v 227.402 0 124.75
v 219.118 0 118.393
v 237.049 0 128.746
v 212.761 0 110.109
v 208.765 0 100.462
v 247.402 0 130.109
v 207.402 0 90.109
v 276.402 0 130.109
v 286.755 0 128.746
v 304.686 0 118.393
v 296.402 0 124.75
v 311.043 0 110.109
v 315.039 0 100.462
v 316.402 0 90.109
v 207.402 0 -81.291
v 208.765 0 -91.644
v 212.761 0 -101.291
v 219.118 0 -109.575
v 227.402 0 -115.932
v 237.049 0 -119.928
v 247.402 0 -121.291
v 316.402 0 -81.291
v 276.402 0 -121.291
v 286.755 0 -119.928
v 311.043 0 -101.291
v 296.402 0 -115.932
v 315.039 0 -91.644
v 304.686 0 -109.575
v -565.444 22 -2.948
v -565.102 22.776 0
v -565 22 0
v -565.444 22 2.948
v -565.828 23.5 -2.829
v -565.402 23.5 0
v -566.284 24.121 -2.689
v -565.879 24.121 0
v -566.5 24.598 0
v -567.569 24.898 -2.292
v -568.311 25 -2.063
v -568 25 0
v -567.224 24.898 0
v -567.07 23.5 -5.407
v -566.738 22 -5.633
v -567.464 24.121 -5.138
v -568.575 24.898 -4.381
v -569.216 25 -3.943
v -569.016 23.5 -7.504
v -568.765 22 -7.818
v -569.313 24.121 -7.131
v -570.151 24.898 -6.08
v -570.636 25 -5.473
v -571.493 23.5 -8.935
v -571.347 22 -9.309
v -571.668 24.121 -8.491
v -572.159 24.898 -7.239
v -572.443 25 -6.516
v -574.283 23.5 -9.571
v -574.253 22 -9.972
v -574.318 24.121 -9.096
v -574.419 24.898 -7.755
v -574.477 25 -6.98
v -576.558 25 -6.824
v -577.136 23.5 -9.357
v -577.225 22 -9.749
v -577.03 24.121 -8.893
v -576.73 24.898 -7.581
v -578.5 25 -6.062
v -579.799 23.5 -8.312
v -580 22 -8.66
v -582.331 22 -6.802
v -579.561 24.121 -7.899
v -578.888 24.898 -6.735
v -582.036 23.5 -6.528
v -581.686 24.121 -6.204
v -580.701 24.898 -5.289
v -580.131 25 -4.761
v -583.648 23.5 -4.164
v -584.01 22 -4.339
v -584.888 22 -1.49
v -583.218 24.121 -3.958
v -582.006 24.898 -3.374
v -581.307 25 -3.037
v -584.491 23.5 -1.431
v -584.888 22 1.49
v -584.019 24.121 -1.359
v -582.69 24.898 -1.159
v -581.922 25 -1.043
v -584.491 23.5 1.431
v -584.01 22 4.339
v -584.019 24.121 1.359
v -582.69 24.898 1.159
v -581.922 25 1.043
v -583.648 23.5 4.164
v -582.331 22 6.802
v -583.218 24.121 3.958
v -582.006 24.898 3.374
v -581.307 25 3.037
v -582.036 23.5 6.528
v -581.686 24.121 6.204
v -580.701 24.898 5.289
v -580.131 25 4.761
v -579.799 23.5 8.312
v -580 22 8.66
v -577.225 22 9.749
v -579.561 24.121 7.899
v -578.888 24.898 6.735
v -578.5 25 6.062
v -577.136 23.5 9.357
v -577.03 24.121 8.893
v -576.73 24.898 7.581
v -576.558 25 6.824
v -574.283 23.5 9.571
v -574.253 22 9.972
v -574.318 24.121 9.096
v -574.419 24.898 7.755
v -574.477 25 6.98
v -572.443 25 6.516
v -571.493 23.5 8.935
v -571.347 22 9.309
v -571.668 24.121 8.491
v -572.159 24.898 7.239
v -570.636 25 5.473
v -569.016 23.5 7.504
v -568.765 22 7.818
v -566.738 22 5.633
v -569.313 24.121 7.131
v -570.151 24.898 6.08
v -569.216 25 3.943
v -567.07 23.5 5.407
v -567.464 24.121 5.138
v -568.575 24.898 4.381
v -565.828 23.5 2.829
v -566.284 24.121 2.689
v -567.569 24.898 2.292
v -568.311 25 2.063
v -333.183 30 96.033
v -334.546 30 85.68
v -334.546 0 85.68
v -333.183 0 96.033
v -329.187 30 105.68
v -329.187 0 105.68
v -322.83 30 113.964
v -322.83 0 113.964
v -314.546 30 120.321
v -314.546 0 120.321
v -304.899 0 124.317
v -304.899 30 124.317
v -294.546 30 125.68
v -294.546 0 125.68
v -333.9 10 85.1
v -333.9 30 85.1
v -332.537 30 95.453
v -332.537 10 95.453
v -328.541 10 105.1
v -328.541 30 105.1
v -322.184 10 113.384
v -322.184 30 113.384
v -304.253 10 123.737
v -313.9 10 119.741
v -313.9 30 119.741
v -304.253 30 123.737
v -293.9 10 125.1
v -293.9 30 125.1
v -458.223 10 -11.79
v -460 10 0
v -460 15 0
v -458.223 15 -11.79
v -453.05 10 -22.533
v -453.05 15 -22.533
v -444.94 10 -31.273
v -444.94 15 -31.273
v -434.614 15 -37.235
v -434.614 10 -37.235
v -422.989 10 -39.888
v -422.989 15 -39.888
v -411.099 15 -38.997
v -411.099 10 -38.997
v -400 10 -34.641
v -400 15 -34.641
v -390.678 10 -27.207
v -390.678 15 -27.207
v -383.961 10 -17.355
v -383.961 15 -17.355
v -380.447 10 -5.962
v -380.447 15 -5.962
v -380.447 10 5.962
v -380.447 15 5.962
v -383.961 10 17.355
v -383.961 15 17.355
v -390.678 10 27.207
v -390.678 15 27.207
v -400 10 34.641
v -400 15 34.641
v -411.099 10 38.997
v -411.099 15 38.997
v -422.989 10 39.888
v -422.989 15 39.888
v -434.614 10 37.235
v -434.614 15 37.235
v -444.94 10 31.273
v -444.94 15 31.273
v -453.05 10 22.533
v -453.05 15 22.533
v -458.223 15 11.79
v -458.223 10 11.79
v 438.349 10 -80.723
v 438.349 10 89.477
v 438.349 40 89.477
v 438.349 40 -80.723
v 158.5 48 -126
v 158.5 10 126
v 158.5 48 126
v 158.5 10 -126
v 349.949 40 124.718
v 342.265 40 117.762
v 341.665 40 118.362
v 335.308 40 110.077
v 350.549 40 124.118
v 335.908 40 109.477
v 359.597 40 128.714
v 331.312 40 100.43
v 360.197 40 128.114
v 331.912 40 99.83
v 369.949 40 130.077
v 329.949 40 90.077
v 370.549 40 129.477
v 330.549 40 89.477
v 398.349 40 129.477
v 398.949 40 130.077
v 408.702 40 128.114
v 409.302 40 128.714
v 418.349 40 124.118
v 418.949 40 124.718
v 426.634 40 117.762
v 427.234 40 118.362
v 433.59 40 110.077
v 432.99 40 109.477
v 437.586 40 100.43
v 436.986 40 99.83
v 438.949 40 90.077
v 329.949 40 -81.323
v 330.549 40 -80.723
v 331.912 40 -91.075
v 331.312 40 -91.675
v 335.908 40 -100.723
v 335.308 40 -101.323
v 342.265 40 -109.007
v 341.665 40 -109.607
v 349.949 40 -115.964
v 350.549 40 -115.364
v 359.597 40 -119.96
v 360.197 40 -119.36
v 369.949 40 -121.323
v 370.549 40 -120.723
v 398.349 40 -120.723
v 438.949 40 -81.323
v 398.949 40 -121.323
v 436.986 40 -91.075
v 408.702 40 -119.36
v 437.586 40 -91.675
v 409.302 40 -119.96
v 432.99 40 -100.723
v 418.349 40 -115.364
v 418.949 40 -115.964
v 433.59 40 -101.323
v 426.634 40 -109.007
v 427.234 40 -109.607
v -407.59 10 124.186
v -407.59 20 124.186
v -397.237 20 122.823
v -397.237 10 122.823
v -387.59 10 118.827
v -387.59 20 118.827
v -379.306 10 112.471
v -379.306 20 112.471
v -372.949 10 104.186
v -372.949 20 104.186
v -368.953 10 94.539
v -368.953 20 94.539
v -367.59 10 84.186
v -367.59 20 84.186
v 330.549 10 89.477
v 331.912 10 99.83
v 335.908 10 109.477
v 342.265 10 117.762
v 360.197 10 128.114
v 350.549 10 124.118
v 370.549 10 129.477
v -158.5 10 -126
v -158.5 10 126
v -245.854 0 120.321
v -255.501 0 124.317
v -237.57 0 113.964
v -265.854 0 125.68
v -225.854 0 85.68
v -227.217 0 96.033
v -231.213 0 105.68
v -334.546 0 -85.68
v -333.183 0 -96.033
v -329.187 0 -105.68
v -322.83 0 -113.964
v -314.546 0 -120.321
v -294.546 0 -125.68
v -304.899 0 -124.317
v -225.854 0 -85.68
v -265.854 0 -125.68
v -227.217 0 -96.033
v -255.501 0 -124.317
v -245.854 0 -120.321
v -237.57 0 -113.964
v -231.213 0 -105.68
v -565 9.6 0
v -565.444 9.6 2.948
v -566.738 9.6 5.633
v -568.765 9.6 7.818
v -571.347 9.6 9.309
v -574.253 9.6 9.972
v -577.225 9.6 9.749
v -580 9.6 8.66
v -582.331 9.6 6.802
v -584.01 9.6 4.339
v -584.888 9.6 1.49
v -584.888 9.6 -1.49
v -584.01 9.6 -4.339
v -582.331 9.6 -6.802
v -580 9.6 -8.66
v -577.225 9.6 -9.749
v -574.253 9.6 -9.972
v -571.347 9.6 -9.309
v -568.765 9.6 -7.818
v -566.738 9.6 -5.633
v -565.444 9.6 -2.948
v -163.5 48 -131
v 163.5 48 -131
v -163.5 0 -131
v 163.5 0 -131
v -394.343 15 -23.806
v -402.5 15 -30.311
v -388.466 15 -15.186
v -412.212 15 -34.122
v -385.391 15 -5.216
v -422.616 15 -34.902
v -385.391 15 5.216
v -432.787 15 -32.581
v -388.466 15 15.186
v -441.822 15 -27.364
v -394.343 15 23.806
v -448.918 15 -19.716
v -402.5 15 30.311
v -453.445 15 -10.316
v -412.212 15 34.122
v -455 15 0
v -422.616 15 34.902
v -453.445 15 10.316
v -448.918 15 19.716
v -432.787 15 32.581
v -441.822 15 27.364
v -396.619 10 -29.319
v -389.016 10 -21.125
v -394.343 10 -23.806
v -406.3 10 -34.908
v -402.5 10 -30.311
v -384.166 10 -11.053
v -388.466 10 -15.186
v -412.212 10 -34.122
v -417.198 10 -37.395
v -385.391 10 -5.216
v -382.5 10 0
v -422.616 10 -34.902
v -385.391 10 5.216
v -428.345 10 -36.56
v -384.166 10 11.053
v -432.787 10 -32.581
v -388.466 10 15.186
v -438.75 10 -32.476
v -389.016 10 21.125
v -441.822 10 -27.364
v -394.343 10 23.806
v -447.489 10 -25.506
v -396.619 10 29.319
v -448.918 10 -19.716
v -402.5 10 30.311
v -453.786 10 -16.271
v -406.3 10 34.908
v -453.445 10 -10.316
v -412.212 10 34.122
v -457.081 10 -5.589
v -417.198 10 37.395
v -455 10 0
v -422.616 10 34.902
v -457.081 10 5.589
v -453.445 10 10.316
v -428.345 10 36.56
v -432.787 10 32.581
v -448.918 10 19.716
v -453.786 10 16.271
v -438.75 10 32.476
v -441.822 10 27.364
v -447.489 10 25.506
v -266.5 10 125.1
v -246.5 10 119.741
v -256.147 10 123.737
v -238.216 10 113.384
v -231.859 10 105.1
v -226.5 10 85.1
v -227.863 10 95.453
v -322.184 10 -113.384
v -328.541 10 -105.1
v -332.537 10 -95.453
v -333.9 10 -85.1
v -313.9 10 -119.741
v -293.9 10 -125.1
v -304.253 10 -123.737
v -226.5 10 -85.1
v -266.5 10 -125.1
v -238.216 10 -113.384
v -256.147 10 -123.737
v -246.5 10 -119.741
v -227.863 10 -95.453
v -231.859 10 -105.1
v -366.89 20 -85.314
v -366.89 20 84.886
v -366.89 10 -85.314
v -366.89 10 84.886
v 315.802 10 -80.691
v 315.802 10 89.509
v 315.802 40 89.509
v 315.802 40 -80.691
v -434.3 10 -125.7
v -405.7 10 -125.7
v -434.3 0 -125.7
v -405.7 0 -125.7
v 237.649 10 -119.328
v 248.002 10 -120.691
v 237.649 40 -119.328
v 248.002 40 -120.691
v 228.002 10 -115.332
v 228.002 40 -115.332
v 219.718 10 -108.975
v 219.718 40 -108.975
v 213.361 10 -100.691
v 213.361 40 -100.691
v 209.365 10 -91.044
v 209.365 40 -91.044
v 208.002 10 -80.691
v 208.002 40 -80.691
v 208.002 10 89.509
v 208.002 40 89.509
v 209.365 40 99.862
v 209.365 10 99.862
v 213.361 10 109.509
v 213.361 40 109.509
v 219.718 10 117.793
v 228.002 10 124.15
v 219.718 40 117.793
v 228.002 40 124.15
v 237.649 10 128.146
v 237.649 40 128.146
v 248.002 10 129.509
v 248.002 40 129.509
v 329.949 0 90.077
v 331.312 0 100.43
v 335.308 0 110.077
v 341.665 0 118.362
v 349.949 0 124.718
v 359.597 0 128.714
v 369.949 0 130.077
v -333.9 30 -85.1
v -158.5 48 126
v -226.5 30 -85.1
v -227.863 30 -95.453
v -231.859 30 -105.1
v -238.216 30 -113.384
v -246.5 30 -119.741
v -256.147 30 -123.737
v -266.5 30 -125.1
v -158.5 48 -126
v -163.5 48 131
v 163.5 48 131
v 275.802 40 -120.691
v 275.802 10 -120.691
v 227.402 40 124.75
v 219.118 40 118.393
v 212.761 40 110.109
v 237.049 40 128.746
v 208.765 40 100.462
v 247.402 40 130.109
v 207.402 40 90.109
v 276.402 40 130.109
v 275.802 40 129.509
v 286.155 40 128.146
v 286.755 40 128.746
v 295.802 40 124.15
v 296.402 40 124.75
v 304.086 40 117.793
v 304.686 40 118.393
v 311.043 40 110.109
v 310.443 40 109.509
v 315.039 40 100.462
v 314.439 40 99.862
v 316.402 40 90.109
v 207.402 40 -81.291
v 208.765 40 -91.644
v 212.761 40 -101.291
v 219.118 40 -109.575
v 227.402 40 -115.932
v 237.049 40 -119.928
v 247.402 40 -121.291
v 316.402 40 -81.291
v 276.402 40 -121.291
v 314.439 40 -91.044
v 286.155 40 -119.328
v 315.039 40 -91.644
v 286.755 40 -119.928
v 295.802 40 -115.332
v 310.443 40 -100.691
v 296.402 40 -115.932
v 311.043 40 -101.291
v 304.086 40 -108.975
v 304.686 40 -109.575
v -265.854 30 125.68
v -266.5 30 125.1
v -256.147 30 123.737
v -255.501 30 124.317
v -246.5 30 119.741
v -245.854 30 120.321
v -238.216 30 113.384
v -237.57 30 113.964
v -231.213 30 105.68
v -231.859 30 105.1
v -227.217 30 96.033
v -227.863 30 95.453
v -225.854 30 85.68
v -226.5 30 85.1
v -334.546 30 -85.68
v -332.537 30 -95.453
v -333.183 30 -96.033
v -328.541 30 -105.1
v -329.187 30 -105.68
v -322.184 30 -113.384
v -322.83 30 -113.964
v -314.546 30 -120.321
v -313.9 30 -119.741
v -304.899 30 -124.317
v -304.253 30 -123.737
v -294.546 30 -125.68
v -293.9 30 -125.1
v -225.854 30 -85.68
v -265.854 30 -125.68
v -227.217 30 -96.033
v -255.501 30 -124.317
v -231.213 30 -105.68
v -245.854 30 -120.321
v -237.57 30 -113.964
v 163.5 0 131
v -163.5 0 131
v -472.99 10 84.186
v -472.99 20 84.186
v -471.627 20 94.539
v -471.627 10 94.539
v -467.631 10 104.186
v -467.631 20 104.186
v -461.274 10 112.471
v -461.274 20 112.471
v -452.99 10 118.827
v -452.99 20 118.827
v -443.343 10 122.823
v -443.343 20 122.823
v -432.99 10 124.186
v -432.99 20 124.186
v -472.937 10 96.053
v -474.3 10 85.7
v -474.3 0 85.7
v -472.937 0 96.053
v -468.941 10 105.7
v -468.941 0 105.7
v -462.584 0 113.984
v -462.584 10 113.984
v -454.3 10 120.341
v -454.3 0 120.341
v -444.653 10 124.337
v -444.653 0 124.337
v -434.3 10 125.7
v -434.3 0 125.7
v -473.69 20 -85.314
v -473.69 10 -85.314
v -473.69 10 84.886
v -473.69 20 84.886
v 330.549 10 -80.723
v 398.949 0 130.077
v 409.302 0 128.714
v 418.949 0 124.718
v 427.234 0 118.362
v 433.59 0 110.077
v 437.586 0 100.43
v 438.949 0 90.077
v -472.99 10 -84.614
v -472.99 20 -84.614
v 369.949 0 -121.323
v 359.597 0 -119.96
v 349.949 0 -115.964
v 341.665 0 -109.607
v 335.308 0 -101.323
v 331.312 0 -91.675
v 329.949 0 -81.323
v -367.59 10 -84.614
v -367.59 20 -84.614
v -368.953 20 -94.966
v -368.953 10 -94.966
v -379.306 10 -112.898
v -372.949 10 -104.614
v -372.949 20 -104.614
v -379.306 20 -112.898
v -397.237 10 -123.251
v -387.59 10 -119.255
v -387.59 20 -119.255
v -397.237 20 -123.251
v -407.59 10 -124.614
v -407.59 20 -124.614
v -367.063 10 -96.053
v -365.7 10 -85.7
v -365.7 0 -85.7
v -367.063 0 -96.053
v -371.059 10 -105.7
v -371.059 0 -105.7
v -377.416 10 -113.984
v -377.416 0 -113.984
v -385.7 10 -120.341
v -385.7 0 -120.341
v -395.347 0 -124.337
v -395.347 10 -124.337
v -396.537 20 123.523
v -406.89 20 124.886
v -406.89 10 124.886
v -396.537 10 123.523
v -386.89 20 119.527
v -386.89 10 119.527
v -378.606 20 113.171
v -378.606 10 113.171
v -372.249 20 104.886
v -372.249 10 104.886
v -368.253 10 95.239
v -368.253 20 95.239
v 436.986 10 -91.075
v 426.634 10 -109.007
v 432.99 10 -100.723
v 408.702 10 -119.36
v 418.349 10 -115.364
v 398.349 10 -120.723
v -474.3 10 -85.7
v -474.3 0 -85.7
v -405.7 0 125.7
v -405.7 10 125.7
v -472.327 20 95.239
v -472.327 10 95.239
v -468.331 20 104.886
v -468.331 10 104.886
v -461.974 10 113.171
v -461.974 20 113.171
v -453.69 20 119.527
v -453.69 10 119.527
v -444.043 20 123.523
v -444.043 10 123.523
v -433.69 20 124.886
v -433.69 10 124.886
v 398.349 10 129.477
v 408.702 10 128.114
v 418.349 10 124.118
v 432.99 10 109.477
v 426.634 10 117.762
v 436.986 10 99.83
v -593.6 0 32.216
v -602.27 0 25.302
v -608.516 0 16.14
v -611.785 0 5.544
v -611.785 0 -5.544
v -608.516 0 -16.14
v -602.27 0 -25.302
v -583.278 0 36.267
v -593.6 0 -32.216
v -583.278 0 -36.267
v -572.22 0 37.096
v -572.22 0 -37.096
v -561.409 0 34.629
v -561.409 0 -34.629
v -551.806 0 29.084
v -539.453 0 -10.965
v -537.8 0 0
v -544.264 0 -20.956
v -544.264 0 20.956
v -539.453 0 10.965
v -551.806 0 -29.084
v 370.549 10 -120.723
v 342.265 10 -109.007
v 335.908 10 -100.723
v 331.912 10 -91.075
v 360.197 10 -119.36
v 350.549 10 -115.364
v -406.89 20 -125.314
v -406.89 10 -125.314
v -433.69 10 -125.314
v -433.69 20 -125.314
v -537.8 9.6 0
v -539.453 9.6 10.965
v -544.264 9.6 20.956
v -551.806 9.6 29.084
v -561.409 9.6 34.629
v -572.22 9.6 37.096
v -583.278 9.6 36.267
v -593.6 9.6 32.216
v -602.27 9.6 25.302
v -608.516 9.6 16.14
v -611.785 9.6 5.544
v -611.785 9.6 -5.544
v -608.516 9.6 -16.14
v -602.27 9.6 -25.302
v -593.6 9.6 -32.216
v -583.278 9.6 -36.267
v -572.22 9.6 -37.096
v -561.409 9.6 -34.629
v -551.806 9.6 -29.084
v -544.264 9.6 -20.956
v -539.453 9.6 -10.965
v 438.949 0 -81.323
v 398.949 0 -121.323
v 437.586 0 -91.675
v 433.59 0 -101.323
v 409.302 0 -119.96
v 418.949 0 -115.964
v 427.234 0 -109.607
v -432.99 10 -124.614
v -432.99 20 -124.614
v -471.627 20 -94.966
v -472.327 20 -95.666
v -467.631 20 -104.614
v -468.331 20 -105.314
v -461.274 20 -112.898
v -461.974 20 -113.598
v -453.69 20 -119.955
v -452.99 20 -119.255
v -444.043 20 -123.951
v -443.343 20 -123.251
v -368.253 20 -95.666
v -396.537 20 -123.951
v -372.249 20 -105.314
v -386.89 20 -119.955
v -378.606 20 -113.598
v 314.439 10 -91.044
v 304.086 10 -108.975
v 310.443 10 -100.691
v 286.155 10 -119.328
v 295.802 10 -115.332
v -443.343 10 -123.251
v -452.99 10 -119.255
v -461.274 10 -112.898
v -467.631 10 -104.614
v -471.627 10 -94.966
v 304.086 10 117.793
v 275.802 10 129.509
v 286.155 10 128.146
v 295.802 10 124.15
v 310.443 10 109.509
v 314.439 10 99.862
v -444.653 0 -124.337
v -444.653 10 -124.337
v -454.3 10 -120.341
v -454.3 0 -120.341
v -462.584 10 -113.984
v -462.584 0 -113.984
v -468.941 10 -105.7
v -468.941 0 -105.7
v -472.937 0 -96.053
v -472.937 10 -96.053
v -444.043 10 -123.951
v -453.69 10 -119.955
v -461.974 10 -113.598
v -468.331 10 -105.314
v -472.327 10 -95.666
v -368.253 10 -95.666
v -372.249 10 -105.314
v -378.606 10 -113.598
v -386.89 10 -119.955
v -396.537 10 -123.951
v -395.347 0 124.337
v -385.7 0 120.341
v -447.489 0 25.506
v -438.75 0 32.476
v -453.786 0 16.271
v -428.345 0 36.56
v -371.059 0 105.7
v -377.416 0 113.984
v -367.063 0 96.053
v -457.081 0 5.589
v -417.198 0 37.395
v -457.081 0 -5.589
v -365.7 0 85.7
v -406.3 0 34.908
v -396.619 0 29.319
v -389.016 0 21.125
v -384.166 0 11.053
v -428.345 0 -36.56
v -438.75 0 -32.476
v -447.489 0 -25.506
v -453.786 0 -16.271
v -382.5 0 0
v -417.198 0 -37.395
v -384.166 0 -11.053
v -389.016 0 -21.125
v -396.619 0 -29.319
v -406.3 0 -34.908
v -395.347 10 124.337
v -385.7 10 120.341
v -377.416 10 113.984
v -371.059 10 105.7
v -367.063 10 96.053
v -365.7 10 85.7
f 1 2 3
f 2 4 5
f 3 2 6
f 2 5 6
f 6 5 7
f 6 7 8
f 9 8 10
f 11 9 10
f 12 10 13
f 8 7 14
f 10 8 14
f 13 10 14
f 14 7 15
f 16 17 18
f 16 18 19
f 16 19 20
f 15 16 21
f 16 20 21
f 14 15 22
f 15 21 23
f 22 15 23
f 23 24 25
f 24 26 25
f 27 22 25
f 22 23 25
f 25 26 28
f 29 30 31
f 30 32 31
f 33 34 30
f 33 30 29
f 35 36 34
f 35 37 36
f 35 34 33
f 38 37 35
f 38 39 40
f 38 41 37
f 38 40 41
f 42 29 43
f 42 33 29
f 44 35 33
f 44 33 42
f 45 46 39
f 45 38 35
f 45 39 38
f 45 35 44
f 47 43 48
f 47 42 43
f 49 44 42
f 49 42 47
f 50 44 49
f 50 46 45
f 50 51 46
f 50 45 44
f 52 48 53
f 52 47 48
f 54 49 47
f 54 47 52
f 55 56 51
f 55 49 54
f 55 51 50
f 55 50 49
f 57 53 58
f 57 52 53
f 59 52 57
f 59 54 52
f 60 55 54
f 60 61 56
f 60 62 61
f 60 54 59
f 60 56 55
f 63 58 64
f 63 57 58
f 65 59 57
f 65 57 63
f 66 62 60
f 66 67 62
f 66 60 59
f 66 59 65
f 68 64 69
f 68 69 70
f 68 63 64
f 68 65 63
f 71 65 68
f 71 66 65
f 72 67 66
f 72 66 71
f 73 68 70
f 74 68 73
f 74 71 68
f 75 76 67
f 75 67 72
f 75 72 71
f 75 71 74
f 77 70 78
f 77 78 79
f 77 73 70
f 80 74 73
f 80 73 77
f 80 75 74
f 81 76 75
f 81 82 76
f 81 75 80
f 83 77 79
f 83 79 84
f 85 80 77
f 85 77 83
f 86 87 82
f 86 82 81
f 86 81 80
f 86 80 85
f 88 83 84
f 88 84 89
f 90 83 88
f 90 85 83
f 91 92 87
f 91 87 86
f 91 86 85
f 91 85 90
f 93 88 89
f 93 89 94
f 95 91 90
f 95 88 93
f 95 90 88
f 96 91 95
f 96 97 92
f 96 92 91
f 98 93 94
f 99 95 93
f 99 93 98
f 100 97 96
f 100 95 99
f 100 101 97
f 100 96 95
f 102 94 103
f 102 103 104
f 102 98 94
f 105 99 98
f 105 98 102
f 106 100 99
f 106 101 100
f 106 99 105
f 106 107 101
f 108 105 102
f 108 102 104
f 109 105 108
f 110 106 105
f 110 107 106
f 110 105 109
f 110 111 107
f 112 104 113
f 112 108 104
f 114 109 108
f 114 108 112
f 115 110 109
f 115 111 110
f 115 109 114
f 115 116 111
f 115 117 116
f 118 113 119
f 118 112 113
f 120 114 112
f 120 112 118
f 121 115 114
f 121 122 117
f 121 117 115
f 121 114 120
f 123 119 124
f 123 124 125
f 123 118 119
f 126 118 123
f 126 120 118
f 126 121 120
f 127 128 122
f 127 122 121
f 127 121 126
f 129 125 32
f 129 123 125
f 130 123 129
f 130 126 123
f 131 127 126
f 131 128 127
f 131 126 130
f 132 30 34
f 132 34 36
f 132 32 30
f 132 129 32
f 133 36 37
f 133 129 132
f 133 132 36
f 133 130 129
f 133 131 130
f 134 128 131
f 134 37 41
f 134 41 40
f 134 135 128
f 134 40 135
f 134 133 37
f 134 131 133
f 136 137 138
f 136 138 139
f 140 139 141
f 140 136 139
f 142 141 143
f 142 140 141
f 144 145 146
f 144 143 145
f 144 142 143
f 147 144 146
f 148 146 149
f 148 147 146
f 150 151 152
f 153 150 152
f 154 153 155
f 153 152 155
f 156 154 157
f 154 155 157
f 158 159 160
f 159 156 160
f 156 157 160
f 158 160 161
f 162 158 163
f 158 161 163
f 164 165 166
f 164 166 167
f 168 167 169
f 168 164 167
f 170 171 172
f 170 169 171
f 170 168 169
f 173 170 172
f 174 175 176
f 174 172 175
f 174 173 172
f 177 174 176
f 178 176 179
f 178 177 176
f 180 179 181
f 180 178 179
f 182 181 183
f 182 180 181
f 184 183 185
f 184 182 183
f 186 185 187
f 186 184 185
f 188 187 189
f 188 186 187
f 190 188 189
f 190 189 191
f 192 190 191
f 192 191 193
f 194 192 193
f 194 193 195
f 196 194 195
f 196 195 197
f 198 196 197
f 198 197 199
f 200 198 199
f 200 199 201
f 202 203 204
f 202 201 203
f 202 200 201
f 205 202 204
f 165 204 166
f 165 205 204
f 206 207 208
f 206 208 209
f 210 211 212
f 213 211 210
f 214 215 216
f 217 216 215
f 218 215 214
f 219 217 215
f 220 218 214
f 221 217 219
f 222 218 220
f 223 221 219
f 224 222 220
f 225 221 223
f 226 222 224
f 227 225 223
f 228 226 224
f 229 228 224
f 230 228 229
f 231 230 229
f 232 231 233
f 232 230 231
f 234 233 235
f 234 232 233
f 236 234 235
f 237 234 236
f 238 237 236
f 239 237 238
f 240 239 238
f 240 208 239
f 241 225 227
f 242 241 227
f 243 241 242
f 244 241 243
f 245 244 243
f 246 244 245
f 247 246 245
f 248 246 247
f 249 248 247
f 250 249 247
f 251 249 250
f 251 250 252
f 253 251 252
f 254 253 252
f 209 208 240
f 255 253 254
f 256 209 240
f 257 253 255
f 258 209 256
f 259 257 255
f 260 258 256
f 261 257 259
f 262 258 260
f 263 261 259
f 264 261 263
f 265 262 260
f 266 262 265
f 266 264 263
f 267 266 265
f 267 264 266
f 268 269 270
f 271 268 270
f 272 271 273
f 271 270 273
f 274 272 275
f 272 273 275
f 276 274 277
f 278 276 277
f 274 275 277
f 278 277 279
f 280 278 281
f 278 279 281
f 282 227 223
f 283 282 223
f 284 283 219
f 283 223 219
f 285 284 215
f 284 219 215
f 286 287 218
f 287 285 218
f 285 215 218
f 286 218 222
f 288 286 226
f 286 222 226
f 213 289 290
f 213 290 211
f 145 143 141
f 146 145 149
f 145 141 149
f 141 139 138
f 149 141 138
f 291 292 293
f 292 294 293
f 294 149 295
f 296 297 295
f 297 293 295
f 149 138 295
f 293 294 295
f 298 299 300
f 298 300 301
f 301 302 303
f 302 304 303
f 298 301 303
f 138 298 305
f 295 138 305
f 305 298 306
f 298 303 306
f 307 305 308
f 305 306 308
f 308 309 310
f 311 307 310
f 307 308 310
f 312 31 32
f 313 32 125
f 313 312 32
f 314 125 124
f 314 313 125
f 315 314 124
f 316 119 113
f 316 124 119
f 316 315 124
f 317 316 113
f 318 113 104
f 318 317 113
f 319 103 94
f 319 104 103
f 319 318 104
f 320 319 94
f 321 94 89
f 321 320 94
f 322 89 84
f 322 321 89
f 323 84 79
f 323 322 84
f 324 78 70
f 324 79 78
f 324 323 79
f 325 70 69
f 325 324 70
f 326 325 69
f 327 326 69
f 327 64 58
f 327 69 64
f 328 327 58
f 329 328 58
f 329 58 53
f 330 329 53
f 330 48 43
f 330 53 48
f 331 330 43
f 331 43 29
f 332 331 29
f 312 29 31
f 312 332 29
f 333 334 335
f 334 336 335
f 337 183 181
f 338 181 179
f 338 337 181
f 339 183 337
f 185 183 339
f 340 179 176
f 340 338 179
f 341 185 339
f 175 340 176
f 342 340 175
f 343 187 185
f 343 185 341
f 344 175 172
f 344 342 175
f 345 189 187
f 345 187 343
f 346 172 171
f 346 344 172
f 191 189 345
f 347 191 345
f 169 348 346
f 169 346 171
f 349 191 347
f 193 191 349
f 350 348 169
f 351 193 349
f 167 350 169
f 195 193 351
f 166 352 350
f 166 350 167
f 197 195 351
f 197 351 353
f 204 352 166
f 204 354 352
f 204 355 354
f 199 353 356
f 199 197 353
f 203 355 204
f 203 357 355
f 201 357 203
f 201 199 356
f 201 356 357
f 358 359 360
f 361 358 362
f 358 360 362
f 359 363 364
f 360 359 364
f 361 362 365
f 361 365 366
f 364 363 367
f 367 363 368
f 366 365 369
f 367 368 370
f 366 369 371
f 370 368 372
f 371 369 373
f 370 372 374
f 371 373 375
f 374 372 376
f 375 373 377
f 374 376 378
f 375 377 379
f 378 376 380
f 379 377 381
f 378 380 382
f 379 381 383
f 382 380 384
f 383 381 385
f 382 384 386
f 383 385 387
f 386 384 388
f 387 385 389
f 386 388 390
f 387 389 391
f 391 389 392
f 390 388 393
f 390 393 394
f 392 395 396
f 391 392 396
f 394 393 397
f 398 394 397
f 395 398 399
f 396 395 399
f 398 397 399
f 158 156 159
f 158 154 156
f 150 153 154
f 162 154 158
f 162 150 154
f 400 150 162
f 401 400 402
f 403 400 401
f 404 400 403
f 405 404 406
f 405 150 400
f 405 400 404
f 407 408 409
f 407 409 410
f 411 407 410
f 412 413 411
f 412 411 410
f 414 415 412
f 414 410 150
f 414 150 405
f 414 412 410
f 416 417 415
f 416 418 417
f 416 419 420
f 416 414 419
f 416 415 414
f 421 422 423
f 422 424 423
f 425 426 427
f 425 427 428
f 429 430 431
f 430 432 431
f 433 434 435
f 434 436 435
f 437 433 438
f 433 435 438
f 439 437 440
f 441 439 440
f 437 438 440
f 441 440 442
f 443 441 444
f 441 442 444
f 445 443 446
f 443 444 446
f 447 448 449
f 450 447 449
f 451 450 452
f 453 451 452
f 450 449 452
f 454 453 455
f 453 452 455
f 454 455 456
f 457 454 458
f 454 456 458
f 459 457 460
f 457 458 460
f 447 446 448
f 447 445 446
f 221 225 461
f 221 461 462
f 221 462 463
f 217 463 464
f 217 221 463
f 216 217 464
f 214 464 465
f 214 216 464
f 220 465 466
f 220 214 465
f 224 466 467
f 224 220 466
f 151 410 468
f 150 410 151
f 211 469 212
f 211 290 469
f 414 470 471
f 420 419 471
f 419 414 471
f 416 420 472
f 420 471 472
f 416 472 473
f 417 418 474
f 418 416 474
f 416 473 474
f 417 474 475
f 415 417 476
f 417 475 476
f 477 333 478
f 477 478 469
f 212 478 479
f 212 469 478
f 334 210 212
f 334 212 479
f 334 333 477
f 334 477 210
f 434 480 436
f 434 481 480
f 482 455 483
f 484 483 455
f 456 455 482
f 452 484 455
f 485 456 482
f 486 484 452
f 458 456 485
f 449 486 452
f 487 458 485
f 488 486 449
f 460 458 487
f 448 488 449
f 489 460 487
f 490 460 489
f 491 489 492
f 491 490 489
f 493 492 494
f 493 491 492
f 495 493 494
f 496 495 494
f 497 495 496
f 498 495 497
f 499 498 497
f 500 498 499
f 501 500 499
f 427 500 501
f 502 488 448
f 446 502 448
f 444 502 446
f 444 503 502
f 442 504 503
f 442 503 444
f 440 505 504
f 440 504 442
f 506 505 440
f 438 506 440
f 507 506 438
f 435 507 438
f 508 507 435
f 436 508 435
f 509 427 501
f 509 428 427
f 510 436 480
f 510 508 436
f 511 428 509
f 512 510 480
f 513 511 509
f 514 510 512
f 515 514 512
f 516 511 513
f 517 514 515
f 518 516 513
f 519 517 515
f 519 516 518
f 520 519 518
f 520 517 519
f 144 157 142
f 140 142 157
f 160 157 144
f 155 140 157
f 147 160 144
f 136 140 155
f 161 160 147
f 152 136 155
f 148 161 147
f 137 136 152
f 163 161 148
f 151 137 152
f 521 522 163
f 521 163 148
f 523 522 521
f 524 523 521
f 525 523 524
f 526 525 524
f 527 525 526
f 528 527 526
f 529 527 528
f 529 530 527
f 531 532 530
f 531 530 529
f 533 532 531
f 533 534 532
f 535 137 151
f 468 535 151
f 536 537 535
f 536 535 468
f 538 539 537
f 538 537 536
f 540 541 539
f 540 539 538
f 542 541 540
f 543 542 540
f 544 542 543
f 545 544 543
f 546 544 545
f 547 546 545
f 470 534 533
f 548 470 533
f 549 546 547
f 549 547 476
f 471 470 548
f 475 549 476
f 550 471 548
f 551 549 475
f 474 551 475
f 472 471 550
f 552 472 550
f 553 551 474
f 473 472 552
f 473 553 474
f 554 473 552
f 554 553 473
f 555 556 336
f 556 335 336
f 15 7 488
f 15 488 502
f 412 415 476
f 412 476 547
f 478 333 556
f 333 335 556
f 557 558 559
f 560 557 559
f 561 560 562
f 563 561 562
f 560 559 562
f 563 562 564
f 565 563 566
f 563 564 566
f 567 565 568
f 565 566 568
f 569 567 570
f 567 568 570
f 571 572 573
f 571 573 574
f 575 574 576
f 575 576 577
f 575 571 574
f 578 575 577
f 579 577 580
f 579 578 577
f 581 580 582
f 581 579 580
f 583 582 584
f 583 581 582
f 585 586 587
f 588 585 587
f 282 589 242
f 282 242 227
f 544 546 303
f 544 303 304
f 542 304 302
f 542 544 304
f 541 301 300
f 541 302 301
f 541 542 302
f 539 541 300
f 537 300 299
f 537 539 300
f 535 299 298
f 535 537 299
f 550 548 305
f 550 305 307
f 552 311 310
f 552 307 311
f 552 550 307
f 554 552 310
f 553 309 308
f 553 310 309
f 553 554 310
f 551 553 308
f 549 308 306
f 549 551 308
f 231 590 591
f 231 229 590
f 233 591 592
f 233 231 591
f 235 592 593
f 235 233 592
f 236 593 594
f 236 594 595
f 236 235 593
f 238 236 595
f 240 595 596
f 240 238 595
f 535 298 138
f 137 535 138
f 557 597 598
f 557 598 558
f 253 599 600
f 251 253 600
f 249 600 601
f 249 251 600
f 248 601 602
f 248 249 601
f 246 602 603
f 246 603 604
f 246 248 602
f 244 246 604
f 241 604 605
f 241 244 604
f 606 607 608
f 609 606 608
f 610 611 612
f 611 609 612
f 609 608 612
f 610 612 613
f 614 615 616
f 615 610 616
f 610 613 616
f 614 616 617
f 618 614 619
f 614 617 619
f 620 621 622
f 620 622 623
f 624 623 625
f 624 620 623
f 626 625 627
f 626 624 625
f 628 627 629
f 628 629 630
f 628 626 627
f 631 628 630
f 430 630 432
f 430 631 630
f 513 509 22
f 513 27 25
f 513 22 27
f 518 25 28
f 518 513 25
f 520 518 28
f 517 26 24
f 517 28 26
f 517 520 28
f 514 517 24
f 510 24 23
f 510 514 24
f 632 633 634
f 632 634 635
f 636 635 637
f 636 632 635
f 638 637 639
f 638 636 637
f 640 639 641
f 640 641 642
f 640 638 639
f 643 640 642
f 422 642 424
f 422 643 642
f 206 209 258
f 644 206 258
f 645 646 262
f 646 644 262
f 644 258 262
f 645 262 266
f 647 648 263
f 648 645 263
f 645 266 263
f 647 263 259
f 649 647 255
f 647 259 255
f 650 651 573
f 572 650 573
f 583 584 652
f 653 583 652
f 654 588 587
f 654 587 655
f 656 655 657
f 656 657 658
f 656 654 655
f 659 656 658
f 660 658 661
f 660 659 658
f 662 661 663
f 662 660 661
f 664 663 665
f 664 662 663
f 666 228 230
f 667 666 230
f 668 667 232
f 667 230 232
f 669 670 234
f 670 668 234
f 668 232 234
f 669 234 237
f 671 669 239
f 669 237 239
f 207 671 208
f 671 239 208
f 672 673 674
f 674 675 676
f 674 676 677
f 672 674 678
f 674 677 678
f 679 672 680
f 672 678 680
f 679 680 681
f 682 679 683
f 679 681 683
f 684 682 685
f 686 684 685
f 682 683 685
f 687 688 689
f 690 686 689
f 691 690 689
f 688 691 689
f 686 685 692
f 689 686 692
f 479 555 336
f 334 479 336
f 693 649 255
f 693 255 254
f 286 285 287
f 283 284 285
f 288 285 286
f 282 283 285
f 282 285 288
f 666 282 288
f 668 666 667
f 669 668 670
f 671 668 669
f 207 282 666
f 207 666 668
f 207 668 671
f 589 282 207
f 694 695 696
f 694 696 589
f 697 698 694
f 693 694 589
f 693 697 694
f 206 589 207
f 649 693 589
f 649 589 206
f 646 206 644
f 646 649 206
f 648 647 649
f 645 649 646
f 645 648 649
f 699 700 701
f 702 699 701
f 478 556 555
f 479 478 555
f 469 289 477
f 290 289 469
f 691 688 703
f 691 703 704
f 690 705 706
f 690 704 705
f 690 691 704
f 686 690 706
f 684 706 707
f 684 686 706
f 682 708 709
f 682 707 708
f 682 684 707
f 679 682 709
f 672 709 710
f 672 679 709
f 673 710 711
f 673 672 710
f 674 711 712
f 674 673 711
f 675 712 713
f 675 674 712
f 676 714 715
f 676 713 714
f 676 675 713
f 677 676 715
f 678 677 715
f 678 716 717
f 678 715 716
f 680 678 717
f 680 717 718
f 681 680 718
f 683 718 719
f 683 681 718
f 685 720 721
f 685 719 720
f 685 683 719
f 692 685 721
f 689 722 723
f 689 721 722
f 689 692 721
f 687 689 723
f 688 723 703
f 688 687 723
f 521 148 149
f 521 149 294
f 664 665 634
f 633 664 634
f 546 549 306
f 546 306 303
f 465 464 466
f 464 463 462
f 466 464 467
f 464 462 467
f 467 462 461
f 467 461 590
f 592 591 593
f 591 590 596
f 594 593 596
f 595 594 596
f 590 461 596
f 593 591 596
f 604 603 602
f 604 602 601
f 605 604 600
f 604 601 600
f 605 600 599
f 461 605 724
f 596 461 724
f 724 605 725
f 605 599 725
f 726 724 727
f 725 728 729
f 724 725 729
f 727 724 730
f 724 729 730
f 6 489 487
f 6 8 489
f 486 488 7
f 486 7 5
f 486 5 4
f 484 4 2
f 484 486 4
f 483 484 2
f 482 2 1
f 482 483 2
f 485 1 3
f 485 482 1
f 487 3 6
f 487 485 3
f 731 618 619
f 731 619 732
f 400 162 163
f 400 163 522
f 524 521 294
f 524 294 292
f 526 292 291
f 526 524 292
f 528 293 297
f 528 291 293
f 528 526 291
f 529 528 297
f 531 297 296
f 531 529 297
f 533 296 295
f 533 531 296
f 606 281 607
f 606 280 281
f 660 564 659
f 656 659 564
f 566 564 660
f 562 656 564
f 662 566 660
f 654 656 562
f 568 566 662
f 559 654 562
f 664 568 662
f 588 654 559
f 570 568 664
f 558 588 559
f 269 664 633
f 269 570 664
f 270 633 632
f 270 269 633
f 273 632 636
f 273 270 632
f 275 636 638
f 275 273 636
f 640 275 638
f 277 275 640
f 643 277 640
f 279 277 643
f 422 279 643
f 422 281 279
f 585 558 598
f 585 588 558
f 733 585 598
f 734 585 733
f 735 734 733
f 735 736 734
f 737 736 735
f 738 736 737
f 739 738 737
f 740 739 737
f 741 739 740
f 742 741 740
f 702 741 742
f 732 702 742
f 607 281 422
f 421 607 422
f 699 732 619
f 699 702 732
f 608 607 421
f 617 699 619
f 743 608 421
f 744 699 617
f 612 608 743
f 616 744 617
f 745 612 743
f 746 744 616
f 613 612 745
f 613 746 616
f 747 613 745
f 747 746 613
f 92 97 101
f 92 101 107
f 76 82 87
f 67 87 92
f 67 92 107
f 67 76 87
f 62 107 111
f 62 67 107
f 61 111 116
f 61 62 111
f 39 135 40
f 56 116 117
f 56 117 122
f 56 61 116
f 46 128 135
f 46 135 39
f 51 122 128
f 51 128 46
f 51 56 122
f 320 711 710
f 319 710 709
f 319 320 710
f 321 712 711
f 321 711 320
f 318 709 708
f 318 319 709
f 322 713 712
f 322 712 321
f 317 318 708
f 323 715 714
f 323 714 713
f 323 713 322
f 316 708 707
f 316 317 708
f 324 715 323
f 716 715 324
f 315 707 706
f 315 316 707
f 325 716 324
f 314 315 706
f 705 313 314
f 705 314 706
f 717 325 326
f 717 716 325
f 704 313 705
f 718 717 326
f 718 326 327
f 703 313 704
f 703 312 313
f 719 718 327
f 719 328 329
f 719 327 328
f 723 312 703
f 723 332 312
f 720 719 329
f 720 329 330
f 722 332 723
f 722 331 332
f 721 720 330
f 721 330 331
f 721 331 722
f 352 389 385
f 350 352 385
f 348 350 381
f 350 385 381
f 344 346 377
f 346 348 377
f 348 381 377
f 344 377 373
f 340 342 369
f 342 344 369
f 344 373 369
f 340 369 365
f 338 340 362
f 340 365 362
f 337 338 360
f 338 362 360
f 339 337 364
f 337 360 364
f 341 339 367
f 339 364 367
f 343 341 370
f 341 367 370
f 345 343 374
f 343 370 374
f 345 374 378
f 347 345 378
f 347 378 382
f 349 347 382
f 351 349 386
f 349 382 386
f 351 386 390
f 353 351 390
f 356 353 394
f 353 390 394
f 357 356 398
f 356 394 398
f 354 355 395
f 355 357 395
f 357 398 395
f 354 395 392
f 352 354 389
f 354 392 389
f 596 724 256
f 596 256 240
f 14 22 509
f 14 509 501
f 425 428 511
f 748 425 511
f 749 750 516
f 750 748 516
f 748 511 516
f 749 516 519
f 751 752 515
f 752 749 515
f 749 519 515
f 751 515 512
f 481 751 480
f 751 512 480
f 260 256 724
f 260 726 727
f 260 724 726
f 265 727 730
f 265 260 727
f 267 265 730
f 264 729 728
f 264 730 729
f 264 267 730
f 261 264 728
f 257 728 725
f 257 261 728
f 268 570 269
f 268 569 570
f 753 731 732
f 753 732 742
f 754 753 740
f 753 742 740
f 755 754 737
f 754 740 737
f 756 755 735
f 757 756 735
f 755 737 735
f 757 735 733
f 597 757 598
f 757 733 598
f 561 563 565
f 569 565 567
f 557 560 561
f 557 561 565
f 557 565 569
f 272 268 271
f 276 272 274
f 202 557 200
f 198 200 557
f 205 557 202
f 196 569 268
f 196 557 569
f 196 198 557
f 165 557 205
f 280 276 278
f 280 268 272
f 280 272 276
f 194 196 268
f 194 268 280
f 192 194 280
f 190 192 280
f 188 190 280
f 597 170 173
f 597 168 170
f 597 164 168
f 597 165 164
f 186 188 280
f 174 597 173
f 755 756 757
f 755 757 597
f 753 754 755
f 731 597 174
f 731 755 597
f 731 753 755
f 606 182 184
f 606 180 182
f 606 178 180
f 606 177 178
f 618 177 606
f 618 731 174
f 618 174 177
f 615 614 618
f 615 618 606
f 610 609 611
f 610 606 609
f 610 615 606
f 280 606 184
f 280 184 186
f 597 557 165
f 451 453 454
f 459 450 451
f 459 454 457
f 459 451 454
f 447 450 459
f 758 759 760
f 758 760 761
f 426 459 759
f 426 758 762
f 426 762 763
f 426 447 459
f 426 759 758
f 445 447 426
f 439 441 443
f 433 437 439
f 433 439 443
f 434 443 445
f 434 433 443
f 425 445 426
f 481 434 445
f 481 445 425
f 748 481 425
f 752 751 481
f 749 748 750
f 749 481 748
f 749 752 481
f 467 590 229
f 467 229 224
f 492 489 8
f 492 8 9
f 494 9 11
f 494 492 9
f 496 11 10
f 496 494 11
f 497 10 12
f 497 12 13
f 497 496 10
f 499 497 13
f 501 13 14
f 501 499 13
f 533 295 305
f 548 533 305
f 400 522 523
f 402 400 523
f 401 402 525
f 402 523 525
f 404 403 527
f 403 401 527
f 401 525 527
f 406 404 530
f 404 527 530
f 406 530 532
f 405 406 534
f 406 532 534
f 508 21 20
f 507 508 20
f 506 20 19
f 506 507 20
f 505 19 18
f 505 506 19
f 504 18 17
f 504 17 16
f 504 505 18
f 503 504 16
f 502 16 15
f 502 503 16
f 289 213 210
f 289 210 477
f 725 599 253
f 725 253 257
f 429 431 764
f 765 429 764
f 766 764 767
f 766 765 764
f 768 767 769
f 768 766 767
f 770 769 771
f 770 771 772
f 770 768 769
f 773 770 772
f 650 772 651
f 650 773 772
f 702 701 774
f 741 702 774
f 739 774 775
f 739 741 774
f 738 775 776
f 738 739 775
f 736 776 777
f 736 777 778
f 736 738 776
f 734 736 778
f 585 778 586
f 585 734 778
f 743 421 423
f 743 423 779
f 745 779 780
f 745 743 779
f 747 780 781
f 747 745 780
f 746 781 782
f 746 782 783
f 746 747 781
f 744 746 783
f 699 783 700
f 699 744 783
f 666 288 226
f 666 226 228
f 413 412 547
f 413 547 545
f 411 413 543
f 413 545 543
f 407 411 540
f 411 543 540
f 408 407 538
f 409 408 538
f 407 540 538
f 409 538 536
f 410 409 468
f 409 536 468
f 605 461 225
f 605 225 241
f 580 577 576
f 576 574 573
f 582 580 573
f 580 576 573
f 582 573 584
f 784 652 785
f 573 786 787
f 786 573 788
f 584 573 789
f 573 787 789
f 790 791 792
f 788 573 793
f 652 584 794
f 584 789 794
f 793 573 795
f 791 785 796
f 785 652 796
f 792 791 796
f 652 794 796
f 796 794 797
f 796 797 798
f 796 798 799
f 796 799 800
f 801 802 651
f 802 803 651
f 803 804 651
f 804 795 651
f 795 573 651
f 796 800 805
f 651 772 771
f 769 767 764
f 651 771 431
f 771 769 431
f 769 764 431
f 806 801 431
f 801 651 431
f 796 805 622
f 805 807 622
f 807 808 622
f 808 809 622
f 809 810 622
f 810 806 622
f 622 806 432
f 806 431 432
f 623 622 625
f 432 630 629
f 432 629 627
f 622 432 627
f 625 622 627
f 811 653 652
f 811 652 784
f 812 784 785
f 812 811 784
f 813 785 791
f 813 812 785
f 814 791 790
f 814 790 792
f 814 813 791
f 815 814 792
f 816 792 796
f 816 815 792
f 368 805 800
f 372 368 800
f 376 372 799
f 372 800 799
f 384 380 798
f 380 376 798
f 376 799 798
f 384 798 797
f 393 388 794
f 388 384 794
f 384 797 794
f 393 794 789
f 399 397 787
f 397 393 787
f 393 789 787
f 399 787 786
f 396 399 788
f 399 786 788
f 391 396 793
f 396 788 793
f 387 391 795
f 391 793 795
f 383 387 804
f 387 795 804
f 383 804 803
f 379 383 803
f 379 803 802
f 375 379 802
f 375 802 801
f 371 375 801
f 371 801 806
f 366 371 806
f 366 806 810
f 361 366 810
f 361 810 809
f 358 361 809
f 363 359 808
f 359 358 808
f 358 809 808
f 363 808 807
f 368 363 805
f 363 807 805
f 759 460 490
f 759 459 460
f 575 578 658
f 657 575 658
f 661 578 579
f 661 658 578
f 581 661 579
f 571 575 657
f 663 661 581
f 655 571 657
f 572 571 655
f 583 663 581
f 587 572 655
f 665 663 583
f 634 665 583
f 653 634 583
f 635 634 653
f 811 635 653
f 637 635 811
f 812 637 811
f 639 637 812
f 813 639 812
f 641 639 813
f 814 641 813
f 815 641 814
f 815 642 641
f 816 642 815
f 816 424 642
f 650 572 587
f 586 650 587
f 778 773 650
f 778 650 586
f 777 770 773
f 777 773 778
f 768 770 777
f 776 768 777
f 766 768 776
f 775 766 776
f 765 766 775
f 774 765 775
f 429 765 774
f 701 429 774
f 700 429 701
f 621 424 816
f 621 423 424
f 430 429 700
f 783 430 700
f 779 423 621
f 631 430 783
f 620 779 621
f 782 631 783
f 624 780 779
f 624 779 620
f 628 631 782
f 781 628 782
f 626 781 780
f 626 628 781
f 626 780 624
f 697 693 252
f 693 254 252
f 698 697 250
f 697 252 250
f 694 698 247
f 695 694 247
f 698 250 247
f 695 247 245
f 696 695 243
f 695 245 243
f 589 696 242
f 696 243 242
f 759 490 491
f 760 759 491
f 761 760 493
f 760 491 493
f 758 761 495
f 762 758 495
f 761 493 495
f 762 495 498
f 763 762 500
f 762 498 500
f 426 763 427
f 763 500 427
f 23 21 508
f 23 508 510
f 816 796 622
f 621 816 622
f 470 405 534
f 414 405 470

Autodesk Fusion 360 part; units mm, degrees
sketch "Sketch1" plane through (0, 0, 0) normal (0, 1, 0) x (1, 0, 0)
  line L0 (163.5, 131) -> (-163.5, 131)
  line L1 (-163.5, 131) -> (-163.5, -131)
  line L2 (-163.5, -131) -> (163.5, -131)
  line L3 (163.5, -131) -> (163.5, 131)
  line L4 (163.5, 131) -> (-163.5, -131) construction
  line L5 (-163.5, 131) -> (163.5, -131) construction
  line L6 (158.5, 126) -> (-158.5, 126)
  line L7 (-158.5, 126) -> (-158.5, -126)
  line L8 (-158.5, -126) -> (158.5, -126)
  line L9 (158.5, -126) -> (158.5, 126)
  line L10 (158.5, 126) -> (-158.5, -126) construction
  line L11 (-158.5, 126) -> (158.5, -126) construction
  dimension "d1" = 327
  dimension "d2" = 262
  dimension "d3" = 317
  dimension "d4" = 252
extrude "Extrude1" add sketch "Sketch1" along normal blind 48 makes body 1
sketch "Sketch2" plane through (0, 0, 0) normal (0, 1, 0) x (1, 0, 0)
  line L0 (-161.5, 130) -> (161.5, 130)
  line L1 (161.5, 130) -> (161.5, -130)
  line L2 (161.5, -130) -> (-161.5, -130)
  line L3 (-161.5, -130) -> (-161.5, 130)
  line L4 (-161.5, 130) -> (161.5, -130) construction
  line L5 (161.5, 130) -> (-161.5, -130) construction
  dimension "d7" = 323
  dimension "d8" = 260
extrude "Extrude2" add sketch "Sketch2" along normal blind 10 bodies 1
sketch "Sketch3" plane through (0, 10, 0) normal (0, 1, 0) x (-1, 0, 0)
  line L0 (158.5, 126) -> (-158.5, 126)
  line L1 (-158.5, 126) -> (-158.5, -126)
  line L2 (-158.5, -126) -> (158.5, -126)
  line L3 (158.5, -126) -> (158.5, 126)
sketch "Sketch4" plane through (0, 10, 0) normal (0, 1, 0) x (-1, 0, 0)
  line L0 (158.5, 126) -> (-158.5, 126)
  line L1 (-158.5, 126) -> (-158.5, -126)
  line L2 (-158.5, -126) -> (158.5, -126)
  line L3 (158.5, -126) -> (158.5, 126)
  line L4 (-320, -124) -> (-220, -124)
  line L5 (-220, -124) -> (-220, 124)
  line L6 (-220, 124) -> (-320, 124)
  line L7 (-320, 124) -> (-320, -124)
  line L8 (-320, -124) -> (-220, 124) construction
  line L9 (-220, -124) -> (-320, 124) construction
  point P0 (-270, 0)
  dimension "d17" = 100
  dimension "d18" = 248
sketch "Sketch5" plane through (0, 20, 0) normal (0, 1, 0) x (-1, 0, 0)
sketch "Sketch6" plane through (0, 10, 0) normal (0, 1, 0) x (-1, 0, 0)
  line L0 (158.5, 126) -> (-158.5, 126)
  line L1 (-158.5, 126) -> (-158.5, -126)
  line L2 (-158.5, -126) -> (158.5, -126)
  line L3 (158.5, -126) -> (158.5, 126)
sketch "Sketch9" plane through (0, 20, 0) normal (0, 1, 0) x (-1, 0, 0)
sketch "Sketch10" plane through (0, 10, 0) normal (0, 1, 0) x (-1, 0, 0)
sketch "Sketch11" plane through (0, 0, 0) normal (0, 1, 0) x (1, 0, 0)
sketch "Sketch12" plane through (0, 20, 0) normal (0, 1, 0) x (1, 0, 0)
sketch "Sketch14" plane through (0, 0, 0) normal (0, 1, 0) x (1, 0, 0)
sketch "Sketch15" plane through (0, 0, 0) normal (0, 1, 0) x (1, 0, 0)
  line L0 (207.402, 121.291) -> (316.402, 121.291)
  line L1 (316.402, 121.291) -> (316.402, -130.109)
  line L2 (316.402, -130.109) -> (207.402, -130.109)
  line L3 (207.402, -130.109) -> (207.402, 121.291)
  line L4 (207.402, 121.291) -> (316.402, -130.109) construction
  line L5 (316.402, 121.291) -> (207.402, -130.109) construction
  line L6 (315.802, 120.691) -> (208.002, 120.691)
  line L7 (208.002, 120.691) -> (208.002, -129.509)
  line L8 (208.002, -129.509) -> (315.802, -129.509)
  line L9 (315.802, -129.509) -> (315.802, 120.691)
  line L10 (315.802, 120.691) -> (208.002, -129.509) construction
  line L11 (208.002, 120.691) -> (315.802, -129.509) construction
  point P0 (261.902, -4.409)
  point P1 (261.902, -4.409)
  dimension "d42" = 109
  dimension "d43" = 251.4
  dimension "d44" = 107.8
  dimension "d45" = 250.2
extrude "Extrude8" add sketch "Sketch15" along normal blind 40 separate body makes body 2
extrude "Extrude9" add sketch "Sketch15" along normal blind 10 contours L6 L7 L8 L9 bodies 2
sketch "Sketch16" plane through (0, 0, 0) normal (0, 1, 0) x (1, 0, 0)
sketch "Sketch17" plane through (0, 0, 0) normal (0, 1, 0) x (1, 0, 0)
  line L0 (329.9494, 121.3227) -> (438.9494, 121.3227)
  line L1 (438.9494, 121.3227) -> (438.9494, -130.0773)
  line L2 (438.9494, -130.0773) -> (329.9494, -130.0773)
  line L3 (329.9494, -130.0773) -> (329.9494, 121.3227)
  line L4 (329.9494, 121.3227) -> (438.9494, -130.0773) construction
  line L5 (438.9494, 121.3227) -> (329.9494, -130.0773) construction
  line L6 (438.3494, 120.7227) -> (330.5494, 120.7227)
  line L7 (330.5494, 120.7227) -> (330.5494, -129.4773)
  line L8 (330.5494, -129.4773) -> (438.3494, -129.4773)
  line L9 (438.3494, -129.4773) -> (438.3494, 120.7227)
  line L10 (438.3494, 120.7227) -> (330.5494, -129.4773) construction
  line L11 (330.5494, 120.7227) -> (438.3494, -129.4773) construction
  point P0 (384.4494, -4.3773)
  point P1 (384.4494, -4.3773)
  dimension "d50" = 109
  dimension "d51" = 251.4
  dimension "d52" = 107.8
  dimension "d53" = 250.2
sketch "Sketch18" plane through (0, 0, 0) normal (0, 1, 0) x (1, 0, 0)
  line L0 (434.5, 120.7) -> (325.5, 120.7)
  line L1 (325.5, 120.7) -> (325.5, -120.7)
  line L2 (325.5, -120.7) -> (434.5, -120.7)
  line L3 (434.5, -120.7) -> (434.5, 120.7)
  line L4 (434.5, 120.7) -> (325.5, -120.7) construction
  line L5 (325.5, 120.7) -> (434.5, -120.7) construction
  point P0 (380, 0)
  dimension "d54" = 109
  dimension "d55" = 241.4
sketch "Sketch20" plane through (0, 0, 0) normal (0, 1, 0) x (1, 0, 0)
  line L0 (-225.9, 125.7) -> (-334.5, 125.7)
  line L1 (-334.5, 125.7) -> (-334.5, -125.5)
  line L2 (-334.5, -125.5) -> (-225.9, -125.5)
  line L3 (-225.9, -125.5) -> (-225.9, 125.7)
  line L4 (-225.9, 125.7) -> (-334.5, -125.5) construction
  line L5 (-334.5, 125.7) -> (-225.9, -125.5) construction
  point P0 (-280.2, 0.1)
  dimension "d60" = 108.6
  dimension "d61" = 251.2
sketch "Sketch35" plane through (0, 0, 0) normal (0, 1, 0) x (1, 0, 0)
  line L0 (-365.7, 125.7) -> (-474.3, 125.7)
  line L1 (-474.3, 125.7) -> (-474.3, -125.7)
  line L2 (-474.3, -125.7) -> (-365.7, -125.7)
  line L3 (-365.7, -125.7) -> (-365.7, 125.7)
  line L4 (-365.7, 125.7) -> (-474.3, -125.7) construction
  line L5 (-474.3, 125.7) -> (-365.7, -125.7) construction
  circle A0 centre (-420, 0) radius 37.5
  point P0 (-420, 0)
  dimension "d73" = 108.6
  dimension "d82" = 75
  dimension "d111" = 251.4
sketch "Sketch37" plane through (0, 0, 0) normal (0, 1, 0) x (1, 0, 0)
  line L0 (-366.8902, 125.3136) -> (-473.6902, 125.3136)
  line L1 (-473.6902, 125.3136) -> (-473.6902, -124.8864)
  line L2 (-473.6902, -124.8864) -> (-366.8902, -124.8864)
  line L3 (-366.8902, -124.8864) -> (-366.8902, 125.3136)
  line L4 (-366.8902, 125.3136) -> (-473.6902, -124.8864) construction
  line L5 (-473.6902, 125.3136) -> (-366.8902, -124.8864) construction
  line L6 (-367.5902, 124.6136) -> (-472.9902, 124.6136)
  line L7 (-472.9902, 124.6136) -> (-472.9902, -124.1864)
  line L8 (-472.9902, -124.1864) -> (-367.5902, -124.1864)
  line L9 (-367.5902, -124.1864) -> (-367.5902, 124.6136)
  line L10 (-367.5902, 124.6136) -> (-472.9902, -124.1864) construction
  line L11 (-472.9902, 124.6136) -> (-367.5902, -124.1864) construction
  point P0 (-420.2902, 0.2136)
  point P1 (-420.2902, 0.2136)
  dimension "d76" = 106.8
  dimension "d77" = 250.2
  dimension "d78" = 105.4
  dimension "d79" = 248.8
extrude "Extrude14" add sketch "Sketch37" along normal blind 20 separate body makes body 3
sketch "Sketch38" plane through (0, 0, 0) normal (0, 1, 0) x (1, 0, 0)
extrude "Extrude15" add sketch "Sketch35" along normal blind 10 bodies 3
sketch "Sketch39" plane through (0, 0, 0) normal (0, 1, 0) x (1, 0, 0)
sketch "Sketch40" plane through (0, 0, 0) normal (0, 0, 1) x (1, 0, 0)
sketch "Sketch41" plane through (0, 0, 0) normal (0, 1, 0) x (1, 0, 0)
sketch "Sketch42" plane through (0, 0, 0) normal (0, 1, 0) x (1, 0, 0)
  line L0 (-226.5, 125.1) -> (-333.9, 125.1)
  line L1 (-333.9, 125.1) -> (-333.9, -125.1)
  line L2 (-333.9, -125.1) -> (-226.5, -125.1)
  line L3 (-226.5, -125.1) -> (-226.5, 125.1)
  line L4 (-226.5, 125.1) -> (-333.9, -125.1) construction
  line L5 (-333.9, 125.1) -> (-226.5, -125.1) construction
  line L6 (-225.8538, 125.6801) -> (-334.5462, 125.6801)
  line L7 (-334.5462, 125.6801) -> (-334.5462, -125.6801)
  line L8 (-334.5462, -125.6801) -> (-225.8538, -125.6801)
  line L9 (-225.8538, -125.6801) -> (-225.8538, 125.6801)
  line L10 (-225.8538, 125.6801) -> (-334.5462, -125.6801) construction
  line L11 (-334.5462, 125.6801) -> (-225.8538, -125.6801) construction
  point P0 (-280.2, 0)
  point P1 (-280.2, 0)
  dimension "d85" = 107.4
  dimension "d86" = 250.2
sketch "Sketch43" plane through (0, 0, 0) normal (0, 1, 0) x (1, 0, 0)
sketch "Sketch44" plane through (0, 0, 0) normal (0, 1, 0) x (1, 0, 0)
sketch "Sketch45" plane through (0, 10, 0) normal (0, 1, 0) x (-1, 0, 0)
  circle A0 centre (420, 0) radius 37.5
  line L0 (367.5902, -124.6136) -> (472.9902, -124.6136)
  line L1 (472.9902, -124.6136) -> (472.9902, 124.1864)
  line L2 (472.9902, 124.1864) -> (367.5902, 124.1864)
  line L3 (367.5902, 124.1864) -> (367.5902, -124.6136)
  circle A1 centre (420, 0) radius 40
  circle A2 centre (420, 0) radius 35
  dimension "d91" = 80
  dimension "d92" = 70
extrude "Extrude18" add sketch "Sketch45" along normal blind 5 contours A0 | A1 bodies 3
sketch "Sketch46" plane through (0, 0, 0) normal (0, 0, 1) x (1, 0, 0)
sketch "Sketch47" plane through (0, 0, 0) normal (0, 1, 0) x (1, 0, 0)
sketch "Sketch48" plane through (0, 0, 0) normal (0, 1, 0) x (1, 0, 0)
  circle A0 centre (-575, 0) radius 37.2
  circle A1 centre (-575, 0) radius 10
  dimension "d95" = 74.4
  dimension "d96" = 20
extrude "Extrude19" add sketch "Sketch48" along normal blind 25 separate body contours A1 makes body 4
sketch "Sketch49" plane through (0, 0, 0) normal (0, 1, 0) x (1, 0, 0)
extrude "Extrude20" add sketch "Sketch48" along normal blind 9.6 bodies 4
fillet "Fillet1" radius 3 1 edges at (-584.3233, 25, 3.6162) on bodies 4
extrude "Extrude23" add sketch "Sketch17" along normal blind 40 separate body makes body 5
extrude "Extrude24" add sketch "Sketch17" along normal blind 10 contours L6 L7 L8 L9 bodies 5
extrude "Extrude25" add sketch "Sketch42" along normal blind 30 separate body makes body 6
extrude "Extrude26" add sketch "Sketch42" along normal blind 10 contours L0 L1 L2 L3 bodies 6
fillet "Fillet2" radius 40 1 edges at (-472.9902, 15, -124.6136) on bodies 3
fillet "Fillet3" radius 40 1 edges at (-367.5902, 15, -124.6136) on bodies 3
fillet "Fillet4" radius 40 1 edges at (-226.5, 20, -125.1) on bodies 6
fillet "Fillet5" radius 40 1 edges at (-333.9, 20, -125.1) on bodies 6
fillet "Fillet6" radius 40 1 edges at (-472.9902, 15, 124.1864) on bodies 3
fillet "Fillet7" radius 40 1 edges at (-367.5902, 15, 124.1864) on bodies 3
fillet "Fillet8" radius 40 1 edges at (-226.5, 20, 125.1) on bodies 6
fillet "Fillet9" radius 40 1 edges at (-333.9, 20, 125.1) on bodies 6
fillet "Fillet10" radius 40 1 edges at (208.002, 25, -120.691) on bodies 2
fillet "Fillet11" radius 40 1 edges at (315.802, 25, -120.691) on bodies 2
fillet "Fillet12" radius 40 1 edges at (438.3494, 25, -120.7227) on bodies 5
fillet "Fillet13" radius 40 1 edges at (330.5494, 25, -120.7227) on bodies 5
fillet "Fillet14" radius 40 1 edges at (-366.8902, 15, -125.3136) on bodies 3
fillet "Fillet15" radius 40 1 edges at (-365.7, 5, -125.7) on bodies 3
fillet "Fillet16" radius 40 1 edges at (-473.6902, 15, -125.3136) on bodies 3
fillet "Fillet17" radius 40 1 edges at (-474.3, 5, -125.7) on bodies 3
fillet "Fillet18" radius 40 1 edges at (-473.6902, 15, 124.8864) on bodies 3
fillet "Fillet19" radius 40 1 edges at (-474.3, 5, 125.7) on bodies 3
fillet "Fillet20" radius 40 1 edges at (-366.8902, 15, 124.8864) on bodies 3
fillet "Fillet21" radius 40 1 edges at (-365.7, 5, 125.7) on bodies 3
fillet "Fillet22" radius 40 1 edges at (-225.8538, 15, 125.6801) on bodies 6
fillet "Fillet23" radius 40 1 edges at (-334.5462, 15, 125.6801) on bodies 6
fillet "Fillet24" radius 40 1 edges at (-334.5462, 15, -125.6801) on bodies 6
fillet "Fillet25" radius 40 1 edges at (-225.8538, 15, -125.6801) on bodies 6
fillet "Fillet26" radius 40 1 edges at (207.402, 20, -121.291) on bodies 2
fillet "Fillet27" radius 40 1 edges at (316.402, 20, -121.291) on bodies 2
fillet "Fillet28" radius 40 1 edges at (329.9494, 20, -121.3227) on bodies 5
fillet "Fillet29" radius 40 1 edges at (438.9494, 20, -121.3227) on bodies 5
fillet "Fillet30" radius 40 1 edges at (208.002, 25, 129.509) on bodies 2
fillet "Fillet31" radius 40 1 edges at (315.802, 25, 129.509) on bodies 2
fillet "Fillet32" radius 40 1 edges at (438.3494, 25, 129.4773) on bodies 5
fillet "Fillet33" radius 40 1 edges at (330.5494, 25, 129.4773) on bodies 5
fillet "Fillet34" radius 40 1 edges at (207.402, 20, 130.109) on bodies 2
fillet "Fillet35" radius 40 1 edges at (329.9494, 20, 130.0773) on bodies 5
fillet "Fillet36" radius 40 1 edges at (316.402, 20, 130.109) on bodies 2
fillet "Fillet37" radius 40 1 edges at (438.9494, 20, 130.0773) on bodies 5
equation "d76 = 108 mm - 1.2 mm"
equation "d78 = 106.8 mm - 1.4 mm"
equation "d79 = 250.2 mm - 1.4 mm"
